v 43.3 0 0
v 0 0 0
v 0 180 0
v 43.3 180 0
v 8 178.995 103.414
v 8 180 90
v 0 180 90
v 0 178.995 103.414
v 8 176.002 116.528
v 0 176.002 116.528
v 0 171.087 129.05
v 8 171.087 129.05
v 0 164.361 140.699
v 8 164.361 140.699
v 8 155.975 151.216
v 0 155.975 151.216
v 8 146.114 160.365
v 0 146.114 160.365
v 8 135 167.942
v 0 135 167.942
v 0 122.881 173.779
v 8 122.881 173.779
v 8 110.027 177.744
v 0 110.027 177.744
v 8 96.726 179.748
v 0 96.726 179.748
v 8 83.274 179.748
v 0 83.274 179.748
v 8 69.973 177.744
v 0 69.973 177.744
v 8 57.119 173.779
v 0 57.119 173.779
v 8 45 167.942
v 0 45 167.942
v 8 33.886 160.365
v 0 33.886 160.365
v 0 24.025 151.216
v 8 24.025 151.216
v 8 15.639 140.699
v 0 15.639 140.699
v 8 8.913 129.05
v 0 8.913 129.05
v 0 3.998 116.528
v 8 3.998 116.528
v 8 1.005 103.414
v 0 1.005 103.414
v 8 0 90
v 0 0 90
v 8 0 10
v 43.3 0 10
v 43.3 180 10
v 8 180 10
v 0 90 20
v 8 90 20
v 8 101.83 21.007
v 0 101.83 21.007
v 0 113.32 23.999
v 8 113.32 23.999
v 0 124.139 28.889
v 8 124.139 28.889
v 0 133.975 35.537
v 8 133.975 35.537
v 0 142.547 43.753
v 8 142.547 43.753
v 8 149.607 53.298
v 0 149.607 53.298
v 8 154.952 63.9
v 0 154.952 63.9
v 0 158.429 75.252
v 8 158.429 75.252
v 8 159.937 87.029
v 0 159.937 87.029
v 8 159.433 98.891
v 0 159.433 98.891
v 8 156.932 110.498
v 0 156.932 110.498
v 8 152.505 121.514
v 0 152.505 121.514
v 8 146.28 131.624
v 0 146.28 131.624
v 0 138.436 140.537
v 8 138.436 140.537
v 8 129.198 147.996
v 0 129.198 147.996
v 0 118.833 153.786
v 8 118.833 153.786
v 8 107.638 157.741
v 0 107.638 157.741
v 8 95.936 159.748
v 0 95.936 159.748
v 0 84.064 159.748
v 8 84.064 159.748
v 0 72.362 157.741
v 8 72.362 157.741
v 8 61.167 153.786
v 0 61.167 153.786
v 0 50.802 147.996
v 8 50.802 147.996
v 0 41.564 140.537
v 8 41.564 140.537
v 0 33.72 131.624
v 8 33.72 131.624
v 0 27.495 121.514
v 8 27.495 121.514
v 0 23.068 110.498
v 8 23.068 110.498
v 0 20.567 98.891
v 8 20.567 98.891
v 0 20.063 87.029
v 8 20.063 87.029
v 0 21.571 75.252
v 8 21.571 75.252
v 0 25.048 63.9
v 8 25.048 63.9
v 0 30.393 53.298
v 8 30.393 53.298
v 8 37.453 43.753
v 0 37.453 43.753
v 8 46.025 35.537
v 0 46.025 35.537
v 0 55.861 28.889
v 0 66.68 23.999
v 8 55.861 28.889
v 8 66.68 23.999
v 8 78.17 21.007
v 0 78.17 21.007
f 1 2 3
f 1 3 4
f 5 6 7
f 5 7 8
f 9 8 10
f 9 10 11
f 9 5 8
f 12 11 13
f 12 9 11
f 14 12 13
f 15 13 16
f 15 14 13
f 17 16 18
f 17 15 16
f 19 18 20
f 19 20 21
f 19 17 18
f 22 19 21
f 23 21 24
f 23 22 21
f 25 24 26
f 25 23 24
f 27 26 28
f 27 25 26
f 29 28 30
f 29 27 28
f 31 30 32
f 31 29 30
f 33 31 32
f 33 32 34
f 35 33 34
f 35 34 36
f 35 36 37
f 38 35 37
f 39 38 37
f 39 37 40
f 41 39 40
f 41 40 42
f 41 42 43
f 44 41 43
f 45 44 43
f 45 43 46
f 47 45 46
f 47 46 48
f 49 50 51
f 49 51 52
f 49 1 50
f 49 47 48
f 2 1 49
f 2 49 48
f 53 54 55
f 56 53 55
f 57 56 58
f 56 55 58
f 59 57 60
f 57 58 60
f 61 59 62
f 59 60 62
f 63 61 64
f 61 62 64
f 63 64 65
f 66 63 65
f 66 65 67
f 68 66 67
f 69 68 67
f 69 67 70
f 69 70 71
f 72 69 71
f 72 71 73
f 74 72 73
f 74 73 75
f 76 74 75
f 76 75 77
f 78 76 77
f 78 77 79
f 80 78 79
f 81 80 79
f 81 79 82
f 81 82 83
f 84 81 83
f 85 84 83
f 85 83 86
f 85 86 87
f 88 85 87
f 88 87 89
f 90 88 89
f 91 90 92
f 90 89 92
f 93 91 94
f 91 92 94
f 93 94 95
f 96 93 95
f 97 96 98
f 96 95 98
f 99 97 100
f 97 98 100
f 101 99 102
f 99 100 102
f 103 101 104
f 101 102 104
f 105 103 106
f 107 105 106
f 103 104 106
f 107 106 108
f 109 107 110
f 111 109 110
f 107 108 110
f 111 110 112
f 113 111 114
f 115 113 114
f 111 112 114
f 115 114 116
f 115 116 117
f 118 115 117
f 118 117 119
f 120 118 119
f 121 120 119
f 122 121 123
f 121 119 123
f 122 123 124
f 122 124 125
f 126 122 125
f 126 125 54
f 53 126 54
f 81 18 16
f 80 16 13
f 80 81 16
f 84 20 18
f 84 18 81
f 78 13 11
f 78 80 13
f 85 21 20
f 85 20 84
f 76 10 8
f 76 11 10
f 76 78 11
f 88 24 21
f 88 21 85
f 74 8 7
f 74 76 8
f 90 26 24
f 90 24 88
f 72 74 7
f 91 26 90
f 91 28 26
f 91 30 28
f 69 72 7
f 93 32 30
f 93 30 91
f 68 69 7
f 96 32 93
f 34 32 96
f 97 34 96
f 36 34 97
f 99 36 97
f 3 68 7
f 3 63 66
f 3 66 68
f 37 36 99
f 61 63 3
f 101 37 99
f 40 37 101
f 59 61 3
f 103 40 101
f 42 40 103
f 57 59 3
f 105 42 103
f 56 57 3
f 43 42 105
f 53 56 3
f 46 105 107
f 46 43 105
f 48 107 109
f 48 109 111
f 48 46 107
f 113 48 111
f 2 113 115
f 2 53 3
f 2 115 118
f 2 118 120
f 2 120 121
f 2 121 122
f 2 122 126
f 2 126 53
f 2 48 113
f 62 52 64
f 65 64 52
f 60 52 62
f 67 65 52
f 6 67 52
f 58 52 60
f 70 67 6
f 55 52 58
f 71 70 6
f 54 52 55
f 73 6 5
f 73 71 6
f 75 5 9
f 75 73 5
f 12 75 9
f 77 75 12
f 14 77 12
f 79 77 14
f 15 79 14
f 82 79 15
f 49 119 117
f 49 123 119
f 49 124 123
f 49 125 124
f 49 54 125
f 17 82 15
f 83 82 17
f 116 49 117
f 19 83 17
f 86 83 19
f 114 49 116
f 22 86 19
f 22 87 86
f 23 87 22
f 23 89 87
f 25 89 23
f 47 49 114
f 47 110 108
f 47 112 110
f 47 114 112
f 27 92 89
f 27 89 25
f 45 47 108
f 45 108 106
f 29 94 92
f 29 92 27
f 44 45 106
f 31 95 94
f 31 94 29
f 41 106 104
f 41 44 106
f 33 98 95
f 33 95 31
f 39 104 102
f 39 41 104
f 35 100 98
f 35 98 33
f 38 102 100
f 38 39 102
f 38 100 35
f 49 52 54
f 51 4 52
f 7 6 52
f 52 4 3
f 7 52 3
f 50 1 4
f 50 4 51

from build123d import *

# Parameters (mm, degrees)
EXTRUDE_1_DEPTH     = 180
SKETCH_2_R          = 70
CUT_EXTRUDE_1_DEPTH = 180


with BuildPart() as part:
    # 草图1 → 凸台-拉伸1 (new body)
    with BuildSketch(Plane(origin=(0, 0, 0), x_dir=(1, 0, 0), z_dir=(0, 1, 0))):
        Polygon((0, 0), (43.3, 0), (43.3, -10), (8, -10), (8, -300), (0, -300), align=None)
    extrude(amount=EXTRUDE_1_DEPTH)

    # 草图2 → 切除-拉伸1 (cut)
    with BuildSketch(Plane(origin=(8, 0, 0), x_dir=(0, 0, -1), z_dir=(1, 0, 0))):
        with Locations((-90, 90)):
            Circle(SKETCH_2_R)
        with BuildLine():
            Line((-90, 0), (-300, 0))
            Line((-300, 0), (-300, 180))
            Line((-300, 180), (-90, 180))
            ThreePointArc((-90, 180), (-180, 90), (-90, 0))
        make_face()
    extrude(amount=-CUT_EXTRUDE_1_DEPTH, mode=Mode.SUBTRACT)


solid = part.part
